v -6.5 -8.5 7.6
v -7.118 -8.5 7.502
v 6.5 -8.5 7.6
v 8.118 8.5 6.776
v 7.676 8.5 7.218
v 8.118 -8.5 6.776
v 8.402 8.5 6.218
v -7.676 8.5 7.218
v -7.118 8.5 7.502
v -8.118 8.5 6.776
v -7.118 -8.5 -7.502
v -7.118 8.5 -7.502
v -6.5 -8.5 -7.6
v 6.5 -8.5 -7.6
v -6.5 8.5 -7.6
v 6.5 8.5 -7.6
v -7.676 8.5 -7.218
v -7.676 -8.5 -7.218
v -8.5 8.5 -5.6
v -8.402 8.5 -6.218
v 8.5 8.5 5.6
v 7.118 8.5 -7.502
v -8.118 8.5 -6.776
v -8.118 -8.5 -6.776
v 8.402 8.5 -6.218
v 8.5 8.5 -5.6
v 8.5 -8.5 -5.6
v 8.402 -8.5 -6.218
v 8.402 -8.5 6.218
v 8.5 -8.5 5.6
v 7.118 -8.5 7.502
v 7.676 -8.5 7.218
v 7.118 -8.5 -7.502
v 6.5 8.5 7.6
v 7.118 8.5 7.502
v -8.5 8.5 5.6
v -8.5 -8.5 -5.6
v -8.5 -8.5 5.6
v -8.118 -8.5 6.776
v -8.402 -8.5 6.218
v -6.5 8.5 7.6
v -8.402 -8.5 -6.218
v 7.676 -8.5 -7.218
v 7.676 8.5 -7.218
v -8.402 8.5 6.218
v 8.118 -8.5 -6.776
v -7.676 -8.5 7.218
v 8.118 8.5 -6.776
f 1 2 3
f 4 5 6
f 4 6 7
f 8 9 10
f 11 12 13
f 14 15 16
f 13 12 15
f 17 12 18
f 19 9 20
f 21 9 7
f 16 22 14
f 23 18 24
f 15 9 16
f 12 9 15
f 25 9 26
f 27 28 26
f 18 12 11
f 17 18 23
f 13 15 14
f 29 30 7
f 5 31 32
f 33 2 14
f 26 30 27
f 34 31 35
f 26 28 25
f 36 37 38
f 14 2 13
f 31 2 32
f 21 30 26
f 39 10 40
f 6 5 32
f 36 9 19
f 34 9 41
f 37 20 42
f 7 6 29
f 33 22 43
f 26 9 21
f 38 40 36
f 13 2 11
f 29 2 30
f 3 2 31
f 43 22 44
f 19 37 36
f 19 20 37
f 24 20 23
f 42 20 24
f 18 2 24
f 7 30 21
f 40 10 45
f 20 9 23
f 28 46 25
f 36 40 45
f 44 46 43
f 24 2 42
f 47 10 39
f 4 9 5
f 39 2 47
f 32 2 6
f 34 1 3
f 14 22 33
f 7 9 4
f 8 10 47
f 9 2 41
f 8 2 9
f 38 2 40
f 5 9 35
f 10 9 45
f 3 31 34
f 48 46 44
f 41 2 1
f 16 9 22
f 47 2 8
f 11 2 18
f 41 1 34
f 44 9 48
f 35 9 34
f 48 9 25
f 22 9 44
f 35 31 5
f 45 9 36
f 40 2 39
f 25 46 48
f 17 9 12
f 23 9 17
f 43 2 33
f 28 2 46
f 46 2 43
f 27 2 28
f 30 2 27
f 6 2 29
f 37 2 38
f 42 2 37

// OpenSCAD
// file: ../../lib/brick-hollow.scad
echo(version=version());

module brickHollow(height=9.3, fade=2.5, minSize=[4.6,4.6], maxSize=[5.2, 5.2], center = false){
    echo(height, minSize, maxSize, fade);
    sizeX = max(minSize[0],maxSize[0]); 
   sizeY = max(minSize[1],maxSize[1]); 
    
    posX = center ? 0 : 0.5*sizeX; 
   posY = center ? 0 : 0.5*sizeY;   
   posZ = center ? -0.5 * (height-fade) : 0.5*fade;
    
    cutHelper = 0.2;
    overlapSpace=0.1;
    
    translate([posX, posY, posZ]){
        union(){
            polyhedron(points=[
                [-0.5*minSize[0],-0.5*minSize[1],-0.5*fade],
                [0.5*minSize[0],-0.5*minSize[1],-0.5*fade],
                [0.5*minSize[0],0.5*minSize[1],-0.5*fade],
                [-0.5*minSize[0],0.5*minSize[1],-0.5*fade],
                [-0.5*maxSize[0],-0.5*maxSize[1],0.5*fade],
                [0.5*maxSize[0],-0.5*maxSize[1],0.5*fade],
                [0.5*maxSize[0],0.5*maxSize[1],0.5*fade],
                [-0.5*maxSize[0],0.5*maxSize[1],0.5*fade]
            ], faces=[[0,1,2,3],[1,0,4,5],[2,1,5,6],[3,2,6,7],[0,3,7,4],[7,6,5,4]]);
            
            if(height > fade){
                translate([0,0,0.5*height - overlapSpace]){
                    cube([maxSize[0], maxSize[1], height - fade + overlapSpace], center=true);
                }
            }
            
            translate([0,0,-0.5*(fade + cutHelper) + overlapSpace]){
                cube([minSize[0], minSize[1], cutHelper + overlapSpace], center=true);
            }
        }
    }
}

//brickHollow(height=9.3, maxSize=[5.2,5.2], minSize=[4.6,4.6], center=true);
// file: ../../lib/roundedcube_simple.scad
module roundedcube_simple(size = [1, 1, 1], center = false, radius = 0.5, resolution = 20) {
	// If single value, convert to [x, y, z] vector
	size = (size[0] == undef) ? [size, size, size] : size;

	translate = (center == false) ?
		[radius, radius, radius] :
		[
			radius - (size[0] / 2),
			radius - (size[1] / 2),
			radius - (size[2] / 2)
	];

	translate(v = translate)
	minkowski() {
		cube(size = [
			size[0] - (radius * 2),
			size[1] - (radius * 2),
			size[2] - (radius * 2)
		]);
		sphere(r = radius, $fn = resolution);
	}
}
// file: ../../lib/roundedcube.scad
// More information: https://danielupshaw.com/openscad-rounded-corners/

// Set to 0.01 for higher definition curves (renders slower)
$fs = 0.15;

module roundedcube(size = [1, 1, 1], center = false, radius = 0.5, apply_to = "all", resolution = 20) {
	// If single value, convert to [x, y, z] vector
	size = (size[0] == undef) ? [size, size, size] : size;

	translate_min = radius;
	translate_xmax = size[0] - radius;
	translate_ymax = size[1] - radius;
	translate_zmax = size[2] - radius;

	diameter = radius * 2;

	obj_translate = (center == false) ?
		[0, 0, 0] : [
			-(size[0] / 2),
			-(size[1] / 2),
			-(size[2] / 2)
		];

	translate(v = obj_translate) {
		hull() {
			for (translate_x = [translate_min, translate_xmax]) {
				x_at = (translate_x == translate_min) ? "min" : "max";
				for (translate_y = [translate_min, translate_ymax]) {
					y_at = (translate_y == translate_min) ? "min" : "max";
					for (translate_z = [translate_min, translate_zmax]) {
						z_at = (translate_z == translate_min) ? "min" : "max";

						translate(v = [translate_x, translate_y, translate_z])
						if (
							(apply_to == "all") ||
							(apply_to == "xmin" && x_at == "min") || (apply_to == "xmax" && x_at == "max") ||
							(apply_to == "ymin" && y_at == "min") || (apply_to == "ymax" && y_at == "max") ||
							(apply_to == "zmin" && z_at == "min") || (apply_to == "zmax" && z_at == "max")
						) {
							sphere(r = radius, $fn = resolution);
						} else {
							rotate = 
								(apply_to == "xmin" || apply_to == "xmax" || apply_to == "x") ? [0, 90, 0] : (
								(apply_to == "ymin" || apply_to == "ymax" || apply_to == "y") ? [90, 90, 0] :
								[0, 0, 0]
							);
							rotate(a = rotate)
							cylinder(h = diameter, r = radius, center = true, $fn = resolution);
						}
					}
				}
			}
		}
	}
}
// main file
echo(version=version());

include <../../lib/block-v2.scad>;

width = 17;
height = 15.2;
rounding=2;

roundedcube([width, width, height], true, rounding, "y");
